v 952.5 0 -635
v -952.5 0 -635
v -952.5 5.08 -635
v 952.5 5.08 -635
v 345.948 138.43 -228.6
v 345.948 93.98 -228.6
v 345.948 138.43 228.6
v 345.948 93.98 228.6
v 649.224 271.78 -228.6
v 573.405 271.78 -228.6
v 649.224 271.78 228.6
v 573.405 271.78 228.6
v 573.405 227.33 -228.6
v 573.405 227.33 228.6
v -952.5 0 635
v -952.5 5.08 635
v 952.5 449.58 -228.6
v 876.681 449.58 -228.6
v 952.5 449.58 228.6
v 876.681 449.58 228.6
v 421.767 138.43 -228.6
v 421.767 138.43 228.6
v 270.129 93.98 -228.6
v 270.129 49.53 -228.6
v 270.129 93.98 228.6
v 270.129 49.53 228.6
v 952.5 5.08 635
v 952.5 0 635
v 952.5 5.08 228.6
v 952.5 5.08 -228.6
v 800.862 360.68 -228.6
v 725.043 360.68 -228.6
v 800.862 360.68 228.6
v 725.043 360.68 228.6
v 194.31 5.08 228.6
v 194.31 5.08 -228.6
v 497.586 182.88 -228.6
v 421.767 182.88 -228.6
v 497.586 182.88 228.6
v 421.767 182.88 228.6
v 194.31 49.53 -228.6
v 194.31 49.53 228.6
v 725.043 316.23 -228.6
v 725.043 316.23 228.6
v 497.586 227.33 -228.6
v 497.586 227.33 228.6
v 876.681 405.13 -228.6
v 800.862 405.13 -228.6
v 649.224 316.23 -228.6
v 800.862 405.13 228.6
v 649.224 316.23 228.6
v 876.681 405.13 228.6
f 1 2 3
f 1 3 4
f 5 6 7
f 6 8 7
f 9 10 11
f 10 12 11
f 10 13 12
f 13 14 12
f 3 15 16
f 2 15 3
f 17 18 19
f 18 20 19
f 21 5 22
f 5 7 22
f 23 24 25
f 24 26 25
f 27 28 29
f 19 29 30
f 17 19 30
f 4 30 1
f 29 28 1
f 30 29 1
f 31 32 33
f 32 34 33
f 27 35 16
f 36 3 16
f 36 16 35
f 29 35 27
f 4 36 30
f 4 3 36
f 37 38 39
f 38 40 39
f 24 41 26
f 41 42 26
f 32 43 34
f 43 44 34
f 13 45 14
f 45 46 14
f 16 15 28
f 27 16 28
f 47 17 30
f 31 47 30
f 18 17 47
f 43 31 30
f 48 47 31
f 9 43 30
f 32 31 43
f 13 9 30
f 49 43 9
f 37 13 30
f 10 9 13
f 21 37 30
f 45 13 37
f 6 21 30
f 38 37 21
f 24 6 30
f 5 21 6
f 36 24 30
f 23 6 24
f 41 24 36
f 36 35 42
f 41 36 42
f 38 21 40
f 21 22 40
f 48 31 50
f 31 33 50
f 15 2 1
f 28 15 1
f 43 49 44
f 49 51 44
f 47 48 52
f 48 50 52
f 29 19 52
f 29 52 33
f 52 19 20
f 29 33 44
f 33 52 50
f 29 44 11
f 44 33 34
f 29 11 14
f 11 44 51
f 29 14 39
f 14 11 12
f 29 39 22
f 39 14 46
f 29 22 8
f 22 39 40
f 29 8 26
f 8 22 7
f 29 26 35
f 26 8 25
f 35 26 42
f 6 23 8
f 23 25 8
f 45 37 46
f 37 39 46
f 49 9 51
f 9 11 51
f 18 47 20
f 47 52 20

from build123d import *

# Parameters (mm, degrees)
SKETCH1_W           = 1905
SKETCH1_H           = 1270
BOSS_EXTRUDE1_DEPTH = 5.08
BOSS_EXTRUDE2_DEPTH = 228.6


with BuildPart() as part:
    # Sketch1 → Boss-Extrude1 (new body)
    with BuildSketch(Plane(origin=(0, 0, 0), x_dir=(1, 0, 0), z_dir=(0, 1, 0))):
        Rectangle(SKETCH1_W, SKETCH1_H)
    extrude(amount=BOSS_EXTRUDE1_DEPTH)

    # Sketch2 → Boss-Extrude2 (add, symmetric)
    with BuildSketch(Plane.XY):
        Polygon((194.31, 5.08), (194.31, 49.53), (270.129, 49.53), (270.129, 93.98), (345.948, 93.98), (345.948, 138.43), (421.767, 138.43), (421.767, 182.88), (497.586, 182.88), (497.586, 227.33), (573.405, 227.33), (573.405, 271.78), (649.224, 271.78), (649.224, 316.23), (725.043, 316.23), (725.043, 360.68), (800.862, 360.68), (800.862, 405.13), (876.681, 405.13), (876.681, 449.58), (952.5, 449.58), (952.5, 5.08), align=None)
    extrude(amount=BOSS_EXTRUDE2_DEPTH, both=True)


solid = part.part
